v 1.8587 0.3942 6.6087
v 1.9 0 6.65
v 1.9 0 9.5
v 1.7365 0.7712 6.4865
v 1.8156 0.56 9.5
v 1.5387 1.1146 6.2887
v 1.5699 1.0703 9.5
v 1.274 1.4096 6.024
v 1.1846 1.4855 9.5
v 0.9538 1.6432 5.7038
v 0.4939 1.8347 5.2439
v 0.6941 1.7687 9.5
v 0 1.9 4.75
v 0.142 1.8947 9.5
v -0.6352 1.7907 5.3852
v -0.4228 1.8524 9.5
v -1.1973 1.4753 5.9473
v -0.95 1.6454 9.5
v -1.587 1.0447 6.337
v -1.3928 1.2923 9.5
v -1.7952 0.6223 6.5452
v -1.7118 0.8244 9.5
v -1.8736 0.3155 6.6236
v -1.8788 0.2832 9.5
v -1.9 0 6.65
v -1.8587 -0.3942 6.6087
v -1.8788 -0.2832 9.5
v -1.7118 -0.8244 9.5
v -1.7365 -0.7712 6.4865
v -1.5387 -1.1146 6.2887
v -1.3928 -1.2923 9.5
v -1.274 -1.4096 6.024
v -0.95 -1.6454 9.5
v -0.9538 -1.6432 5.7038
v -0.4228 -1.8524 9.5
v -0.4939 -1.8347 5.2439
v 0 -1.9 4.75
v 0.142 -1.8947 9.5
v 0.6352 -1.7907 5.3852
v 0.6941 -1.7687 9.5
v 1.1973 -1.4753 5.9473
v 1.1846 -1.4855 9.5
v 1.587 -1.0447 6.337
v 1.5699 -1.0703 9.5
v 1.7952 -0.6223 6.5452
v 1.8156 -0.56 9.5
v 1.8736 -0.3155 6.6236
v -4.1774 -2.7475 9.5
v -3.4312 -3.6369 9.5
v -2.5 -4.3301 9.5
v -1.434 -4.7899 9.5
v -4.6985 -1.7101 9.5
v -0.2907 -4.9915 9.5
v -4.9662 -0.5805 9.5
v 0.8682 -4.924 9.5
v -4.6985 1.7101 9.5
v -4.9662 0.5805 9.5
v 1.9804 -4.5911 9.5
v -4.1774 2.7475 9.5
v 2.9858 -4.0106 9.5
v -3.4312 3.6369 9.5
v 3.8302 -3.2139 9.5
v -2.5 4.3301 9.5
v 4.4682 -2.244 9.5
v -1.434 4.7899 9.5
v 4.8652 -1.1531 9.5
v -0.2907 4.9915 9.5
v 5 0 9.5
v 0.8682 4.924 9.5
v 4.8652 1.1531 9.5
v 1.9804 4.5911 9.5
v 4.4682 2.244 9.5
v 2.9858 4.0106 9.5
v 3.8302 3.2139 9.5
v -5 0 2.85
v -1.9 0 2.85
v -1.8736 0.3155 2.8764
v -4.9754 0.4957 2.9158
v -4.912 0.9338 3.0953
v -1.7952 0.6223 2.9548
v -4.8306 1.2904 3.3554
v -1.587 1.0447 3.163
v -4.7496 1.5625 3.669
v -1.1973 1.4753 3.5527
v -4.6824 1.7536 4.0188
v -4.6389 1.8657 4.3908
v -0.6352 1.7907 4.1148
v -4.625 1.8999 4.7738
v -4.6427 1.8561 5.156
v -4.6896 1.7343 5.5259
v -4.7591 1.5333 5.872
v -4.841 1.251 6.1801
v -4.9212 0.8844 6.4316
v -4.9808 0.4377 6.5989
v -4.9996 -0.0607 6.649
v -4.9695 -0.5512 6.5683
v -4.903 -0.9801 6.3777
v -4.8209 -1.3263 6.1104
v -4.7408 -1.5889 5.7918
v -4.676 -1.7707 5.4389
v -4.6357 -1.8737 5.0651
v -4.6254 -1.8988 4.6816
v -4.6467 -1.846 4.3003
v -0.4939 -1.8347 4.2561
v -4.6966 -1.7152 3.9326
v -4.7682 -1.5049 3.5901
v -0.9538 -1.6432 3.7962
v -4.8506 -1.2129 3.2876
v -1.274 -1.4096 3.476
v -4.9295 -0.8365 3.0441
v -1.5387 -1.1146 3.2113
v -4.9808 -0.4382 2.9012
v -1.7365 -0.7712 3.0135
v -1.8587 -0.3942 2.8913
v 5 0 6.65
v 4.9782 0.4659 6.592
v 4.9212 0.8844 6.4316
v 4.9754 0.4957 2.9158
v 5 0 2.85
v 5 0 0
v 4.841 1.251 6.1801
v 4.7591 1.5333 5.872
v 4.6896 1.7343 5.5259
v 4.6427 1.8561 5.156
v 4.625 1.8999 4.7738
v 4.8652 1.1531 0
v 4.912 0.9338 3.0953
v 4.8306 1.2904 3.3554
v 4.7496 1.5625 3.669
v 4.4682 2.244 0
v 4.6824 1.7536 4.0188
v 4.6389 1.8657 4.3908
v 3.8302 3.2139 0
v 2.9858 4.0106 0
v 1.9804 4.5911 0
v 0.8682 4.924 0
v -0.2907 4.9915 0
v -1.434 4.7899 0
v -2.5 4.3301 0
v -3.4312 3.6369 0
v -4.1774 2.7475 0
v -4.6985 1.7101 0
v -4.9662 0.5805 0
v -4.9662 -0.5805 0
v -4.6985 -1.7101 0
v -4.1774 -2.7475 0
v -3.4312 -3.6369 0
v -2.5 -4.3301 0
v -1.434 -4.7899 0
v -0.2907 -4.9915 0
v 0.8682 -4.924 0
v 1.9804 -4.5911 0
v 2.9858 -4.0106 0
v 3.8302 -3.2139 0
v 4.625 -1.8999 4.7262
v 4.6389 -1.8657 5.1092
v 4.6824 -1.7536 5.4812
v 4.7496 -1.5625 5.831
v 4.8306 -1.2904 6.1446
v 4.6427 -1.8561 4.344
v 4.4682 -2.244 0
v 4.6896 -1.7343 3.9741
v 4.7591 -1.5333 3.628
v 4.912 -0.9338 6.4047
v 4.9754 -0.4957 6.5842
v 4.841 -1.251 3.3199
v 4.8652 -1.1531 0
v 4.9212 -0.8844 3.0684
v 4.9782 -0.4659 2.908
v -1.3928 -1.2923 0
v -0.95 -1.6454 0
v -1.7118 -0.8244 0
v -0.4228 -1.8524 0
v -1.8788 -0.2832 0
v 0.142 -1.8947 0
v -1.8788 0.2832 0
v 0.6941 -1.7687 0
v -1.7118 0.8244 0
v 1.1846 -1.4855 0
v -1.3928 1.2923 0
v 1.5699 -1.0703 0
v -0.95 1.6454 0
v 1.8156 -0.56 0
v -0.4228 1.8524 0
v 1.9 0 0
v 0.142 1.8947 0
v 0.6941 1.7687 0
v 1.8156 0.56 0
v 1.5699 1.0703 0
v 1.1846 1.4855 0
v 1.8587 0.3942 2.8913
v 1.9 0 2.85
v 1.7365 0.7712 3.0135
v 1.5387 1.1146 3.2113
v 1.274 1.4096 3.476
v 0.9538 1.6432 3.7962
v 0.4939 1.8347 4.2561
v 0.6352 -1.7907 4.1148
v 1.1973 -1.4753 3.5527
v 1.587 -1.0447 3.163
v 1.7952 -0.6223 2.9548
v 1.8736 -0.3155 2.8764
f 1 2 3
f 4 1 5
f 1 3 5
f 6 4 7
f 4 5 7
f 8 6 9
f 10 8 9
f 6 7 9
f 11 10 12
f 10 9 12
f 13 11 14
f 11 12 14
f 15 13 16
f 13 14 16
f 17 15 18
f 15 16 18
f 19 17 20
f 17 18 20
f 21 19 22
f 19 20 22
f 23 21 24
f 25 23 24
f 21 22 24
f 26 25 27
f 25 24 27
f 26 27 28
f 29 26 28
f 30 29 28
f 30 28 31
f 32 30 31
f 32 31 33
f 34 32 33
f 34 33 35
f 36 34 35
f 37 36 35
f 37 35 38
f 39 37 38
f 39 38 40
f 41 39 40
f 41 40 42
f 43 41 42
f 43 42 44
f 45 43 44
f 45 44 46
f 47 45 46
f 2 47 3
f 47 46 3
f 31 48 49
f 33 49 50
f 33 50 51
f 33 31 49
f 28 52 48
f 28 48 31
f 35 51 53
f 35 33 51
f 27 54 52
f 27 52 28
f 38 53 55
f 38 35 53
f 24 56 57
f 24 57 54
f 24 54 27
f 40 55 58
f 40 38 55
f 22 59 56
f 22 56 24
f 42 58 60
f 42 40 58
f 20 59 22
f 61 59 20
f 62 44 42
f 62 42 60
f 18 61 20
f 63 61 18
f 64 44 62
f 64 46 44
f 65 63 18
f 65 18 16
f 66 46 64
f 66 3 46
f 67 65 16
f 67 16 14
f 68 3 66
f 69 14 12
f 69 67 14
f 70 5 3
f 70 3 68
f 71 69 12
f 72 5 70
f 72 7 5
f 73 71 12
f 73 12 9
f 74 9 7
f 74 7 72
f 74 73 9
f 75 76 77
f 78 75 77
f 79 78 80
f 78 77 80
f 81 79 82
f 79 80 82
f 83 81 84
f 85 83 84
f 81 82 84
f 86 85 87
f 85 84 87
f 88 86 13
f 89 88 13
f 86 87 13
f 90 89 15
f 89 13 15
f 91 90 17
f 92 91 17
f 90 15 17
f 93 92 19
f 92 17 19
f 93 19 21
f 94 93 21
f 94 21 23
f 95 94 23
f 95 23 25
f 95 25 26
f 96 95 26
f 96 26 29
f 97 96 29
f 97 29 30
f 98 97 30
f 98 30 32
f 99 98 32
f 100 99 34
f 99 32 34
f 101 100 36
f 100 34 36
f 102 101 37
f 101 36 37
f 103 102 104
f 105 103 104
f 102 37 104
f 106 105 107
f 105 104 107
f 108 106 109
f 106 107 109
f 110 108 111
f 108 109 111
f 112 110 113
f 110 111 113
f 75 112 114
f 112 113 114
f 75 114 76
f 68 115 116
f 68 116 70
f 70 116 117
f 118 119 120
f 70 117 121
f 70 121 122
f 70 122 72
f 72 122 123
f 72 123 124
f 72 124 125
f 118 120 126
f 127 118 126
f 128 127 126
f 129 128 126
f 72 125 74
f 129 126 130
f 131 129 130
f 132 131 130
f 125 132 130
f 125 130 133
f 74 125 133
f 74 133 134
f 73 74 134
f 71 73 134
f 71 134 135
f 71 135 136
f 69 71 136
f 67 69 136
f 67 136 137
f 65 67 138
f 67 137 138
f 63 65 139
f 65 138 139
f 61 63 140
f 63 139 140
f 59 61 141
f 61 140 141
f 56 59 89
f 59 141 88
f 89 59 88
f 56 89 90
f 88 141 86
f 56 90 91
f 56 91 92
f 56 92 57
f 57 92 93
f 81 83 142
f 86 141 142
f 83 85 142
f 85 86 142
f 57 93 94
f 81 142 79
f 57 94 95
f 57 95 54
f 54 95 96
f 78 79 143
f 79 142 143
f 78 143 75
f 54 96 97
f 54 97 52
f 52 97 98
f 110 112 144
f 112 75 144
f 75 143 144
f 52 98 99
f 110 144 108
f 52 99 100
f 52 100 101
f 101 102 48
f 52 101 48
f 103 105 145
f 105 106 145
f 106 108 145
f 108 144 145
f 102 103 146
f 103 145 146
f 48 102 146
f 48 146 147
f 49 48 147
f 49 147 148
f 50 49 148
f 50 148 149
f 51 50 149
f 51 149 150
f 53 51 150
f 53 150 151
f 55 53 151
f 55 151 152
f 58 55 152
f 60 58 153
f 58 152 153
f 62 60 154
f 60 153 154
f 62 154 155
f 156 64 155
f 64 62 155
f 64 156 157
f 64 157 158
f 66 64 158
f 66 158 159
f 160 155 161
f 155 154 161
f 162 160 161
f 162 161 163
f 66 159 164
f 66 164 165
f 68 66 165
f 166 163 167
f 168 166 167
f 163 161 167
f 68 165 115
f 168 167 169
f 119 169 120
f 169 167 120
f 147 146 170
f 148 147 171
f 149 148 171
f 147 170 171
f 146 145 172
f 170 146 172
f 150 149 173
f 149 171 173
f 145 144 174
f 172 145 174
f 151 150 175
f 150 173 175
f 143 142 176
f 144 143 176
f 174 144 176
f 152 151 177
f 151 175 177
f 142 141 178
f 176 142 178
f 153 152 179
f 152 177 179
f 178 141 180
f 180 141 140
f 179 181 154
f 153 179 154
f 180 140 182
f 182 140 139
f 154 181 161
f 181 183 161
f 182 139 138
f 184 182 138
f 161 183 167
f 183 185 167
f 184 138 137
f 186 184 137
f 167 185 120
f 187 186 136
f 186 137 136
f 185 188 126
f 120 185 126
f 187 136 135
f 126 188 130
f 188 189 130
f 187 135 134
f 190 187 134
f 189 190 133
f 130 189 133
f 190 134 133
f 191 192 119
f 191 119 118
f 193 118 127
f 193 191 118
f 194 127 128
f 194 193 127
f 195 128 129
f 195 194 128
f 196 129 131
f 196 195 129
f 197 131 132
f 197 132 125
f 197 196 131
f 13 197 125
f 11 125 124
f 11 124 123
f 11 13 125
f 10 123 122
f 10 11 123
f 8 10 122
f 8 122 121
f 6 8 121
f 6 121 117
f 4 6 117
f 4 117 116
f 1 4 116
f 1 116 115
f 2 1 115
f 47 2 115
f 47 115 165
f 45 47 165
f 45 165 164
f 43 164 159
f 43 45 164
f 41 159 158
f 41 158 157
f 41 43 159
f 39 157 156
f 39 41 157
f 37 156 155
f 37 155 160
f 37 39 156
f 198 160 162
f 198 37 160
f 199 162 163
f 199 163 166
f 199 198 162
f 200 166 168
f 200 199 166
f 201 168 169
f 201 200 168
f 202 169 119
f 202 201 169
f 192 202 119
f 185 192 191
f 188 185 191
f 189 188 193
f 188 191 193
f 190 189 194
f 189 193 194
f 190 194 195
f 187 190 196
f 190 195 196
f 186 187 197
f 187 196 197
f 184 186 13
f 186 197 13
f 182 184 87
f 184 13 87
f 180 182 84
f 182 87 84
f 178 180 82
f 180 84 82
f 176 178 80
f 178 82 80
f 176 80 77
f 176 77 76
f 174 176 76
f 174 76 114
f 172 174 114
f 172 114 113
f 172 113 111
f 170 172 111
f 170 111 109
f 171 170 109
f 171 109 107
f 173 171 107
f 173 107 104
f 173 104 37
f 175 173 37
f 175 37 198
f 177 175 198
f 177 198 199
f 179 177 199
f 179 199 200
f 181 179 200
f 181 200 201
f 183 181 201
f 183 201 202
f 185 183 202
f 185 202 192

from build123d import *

# Parameters (mm, degrees)
SKETCH1_R               = 5
BOSS_EXTRUDE1_DEPTH     = 9.5
SKETCH2_R               = 1.9
CUT_EXTRUDE1_DEPTH      = 1
CUT_EXTRUDE1_DEPTH_BACK = 10.5
SKETCH3_R               = 1.9
CUT_EXTRUDE2_DEPTH      = 6
CUT_EXTRUDE2_DEPTH_BACK = 6


with BuildPart() as part:
    # Sketch1 → Boss-Extrude1 (new body)
    with BuildSketch(Plane.XY):
        Circle(SKETCH1_R)
    extrude(amount=BOSS_EXTRUDE1_DEPTH)

    # Sketch2 → Cut-Extrude1 (cut, two sides)
    with BuildSketch(Plane.XY.offset(9.5)) as cut_extrude1_sk:
        Circle(SKETCH2_R)
    extrude(amount=CUT_EXTRUDE1_DEPTH, mode=Mode.SUBTRACT)
    extrude(cut_extrude1_sk.sketch, amount=-CUT_EXTRUDE1_DEPTH_BACK, mode=Mode.SUBTRACT)

    # Sketch3 → Cut-Extrude2 (cut, two sides)
    with BuildSketch(Plane(origin=(0, 0, 0), x_dir=(0, 0, -1), z_dir=(1, 0, 0))) as cut_extrude2_sk:
        with Locations((-4.75, 0)):
            Circle(SKETCH3_R)
    extrude(amount=CUT_EXTRUDE2_DEPTH, mode=Mode.SUBTRACT)
    extrude(cut_extrude2_sk.sketch, amount=-CUT_EXTRUDE2_DEPTH_BACK, mode=Mode.SUBTRACT)


solid = part.part
